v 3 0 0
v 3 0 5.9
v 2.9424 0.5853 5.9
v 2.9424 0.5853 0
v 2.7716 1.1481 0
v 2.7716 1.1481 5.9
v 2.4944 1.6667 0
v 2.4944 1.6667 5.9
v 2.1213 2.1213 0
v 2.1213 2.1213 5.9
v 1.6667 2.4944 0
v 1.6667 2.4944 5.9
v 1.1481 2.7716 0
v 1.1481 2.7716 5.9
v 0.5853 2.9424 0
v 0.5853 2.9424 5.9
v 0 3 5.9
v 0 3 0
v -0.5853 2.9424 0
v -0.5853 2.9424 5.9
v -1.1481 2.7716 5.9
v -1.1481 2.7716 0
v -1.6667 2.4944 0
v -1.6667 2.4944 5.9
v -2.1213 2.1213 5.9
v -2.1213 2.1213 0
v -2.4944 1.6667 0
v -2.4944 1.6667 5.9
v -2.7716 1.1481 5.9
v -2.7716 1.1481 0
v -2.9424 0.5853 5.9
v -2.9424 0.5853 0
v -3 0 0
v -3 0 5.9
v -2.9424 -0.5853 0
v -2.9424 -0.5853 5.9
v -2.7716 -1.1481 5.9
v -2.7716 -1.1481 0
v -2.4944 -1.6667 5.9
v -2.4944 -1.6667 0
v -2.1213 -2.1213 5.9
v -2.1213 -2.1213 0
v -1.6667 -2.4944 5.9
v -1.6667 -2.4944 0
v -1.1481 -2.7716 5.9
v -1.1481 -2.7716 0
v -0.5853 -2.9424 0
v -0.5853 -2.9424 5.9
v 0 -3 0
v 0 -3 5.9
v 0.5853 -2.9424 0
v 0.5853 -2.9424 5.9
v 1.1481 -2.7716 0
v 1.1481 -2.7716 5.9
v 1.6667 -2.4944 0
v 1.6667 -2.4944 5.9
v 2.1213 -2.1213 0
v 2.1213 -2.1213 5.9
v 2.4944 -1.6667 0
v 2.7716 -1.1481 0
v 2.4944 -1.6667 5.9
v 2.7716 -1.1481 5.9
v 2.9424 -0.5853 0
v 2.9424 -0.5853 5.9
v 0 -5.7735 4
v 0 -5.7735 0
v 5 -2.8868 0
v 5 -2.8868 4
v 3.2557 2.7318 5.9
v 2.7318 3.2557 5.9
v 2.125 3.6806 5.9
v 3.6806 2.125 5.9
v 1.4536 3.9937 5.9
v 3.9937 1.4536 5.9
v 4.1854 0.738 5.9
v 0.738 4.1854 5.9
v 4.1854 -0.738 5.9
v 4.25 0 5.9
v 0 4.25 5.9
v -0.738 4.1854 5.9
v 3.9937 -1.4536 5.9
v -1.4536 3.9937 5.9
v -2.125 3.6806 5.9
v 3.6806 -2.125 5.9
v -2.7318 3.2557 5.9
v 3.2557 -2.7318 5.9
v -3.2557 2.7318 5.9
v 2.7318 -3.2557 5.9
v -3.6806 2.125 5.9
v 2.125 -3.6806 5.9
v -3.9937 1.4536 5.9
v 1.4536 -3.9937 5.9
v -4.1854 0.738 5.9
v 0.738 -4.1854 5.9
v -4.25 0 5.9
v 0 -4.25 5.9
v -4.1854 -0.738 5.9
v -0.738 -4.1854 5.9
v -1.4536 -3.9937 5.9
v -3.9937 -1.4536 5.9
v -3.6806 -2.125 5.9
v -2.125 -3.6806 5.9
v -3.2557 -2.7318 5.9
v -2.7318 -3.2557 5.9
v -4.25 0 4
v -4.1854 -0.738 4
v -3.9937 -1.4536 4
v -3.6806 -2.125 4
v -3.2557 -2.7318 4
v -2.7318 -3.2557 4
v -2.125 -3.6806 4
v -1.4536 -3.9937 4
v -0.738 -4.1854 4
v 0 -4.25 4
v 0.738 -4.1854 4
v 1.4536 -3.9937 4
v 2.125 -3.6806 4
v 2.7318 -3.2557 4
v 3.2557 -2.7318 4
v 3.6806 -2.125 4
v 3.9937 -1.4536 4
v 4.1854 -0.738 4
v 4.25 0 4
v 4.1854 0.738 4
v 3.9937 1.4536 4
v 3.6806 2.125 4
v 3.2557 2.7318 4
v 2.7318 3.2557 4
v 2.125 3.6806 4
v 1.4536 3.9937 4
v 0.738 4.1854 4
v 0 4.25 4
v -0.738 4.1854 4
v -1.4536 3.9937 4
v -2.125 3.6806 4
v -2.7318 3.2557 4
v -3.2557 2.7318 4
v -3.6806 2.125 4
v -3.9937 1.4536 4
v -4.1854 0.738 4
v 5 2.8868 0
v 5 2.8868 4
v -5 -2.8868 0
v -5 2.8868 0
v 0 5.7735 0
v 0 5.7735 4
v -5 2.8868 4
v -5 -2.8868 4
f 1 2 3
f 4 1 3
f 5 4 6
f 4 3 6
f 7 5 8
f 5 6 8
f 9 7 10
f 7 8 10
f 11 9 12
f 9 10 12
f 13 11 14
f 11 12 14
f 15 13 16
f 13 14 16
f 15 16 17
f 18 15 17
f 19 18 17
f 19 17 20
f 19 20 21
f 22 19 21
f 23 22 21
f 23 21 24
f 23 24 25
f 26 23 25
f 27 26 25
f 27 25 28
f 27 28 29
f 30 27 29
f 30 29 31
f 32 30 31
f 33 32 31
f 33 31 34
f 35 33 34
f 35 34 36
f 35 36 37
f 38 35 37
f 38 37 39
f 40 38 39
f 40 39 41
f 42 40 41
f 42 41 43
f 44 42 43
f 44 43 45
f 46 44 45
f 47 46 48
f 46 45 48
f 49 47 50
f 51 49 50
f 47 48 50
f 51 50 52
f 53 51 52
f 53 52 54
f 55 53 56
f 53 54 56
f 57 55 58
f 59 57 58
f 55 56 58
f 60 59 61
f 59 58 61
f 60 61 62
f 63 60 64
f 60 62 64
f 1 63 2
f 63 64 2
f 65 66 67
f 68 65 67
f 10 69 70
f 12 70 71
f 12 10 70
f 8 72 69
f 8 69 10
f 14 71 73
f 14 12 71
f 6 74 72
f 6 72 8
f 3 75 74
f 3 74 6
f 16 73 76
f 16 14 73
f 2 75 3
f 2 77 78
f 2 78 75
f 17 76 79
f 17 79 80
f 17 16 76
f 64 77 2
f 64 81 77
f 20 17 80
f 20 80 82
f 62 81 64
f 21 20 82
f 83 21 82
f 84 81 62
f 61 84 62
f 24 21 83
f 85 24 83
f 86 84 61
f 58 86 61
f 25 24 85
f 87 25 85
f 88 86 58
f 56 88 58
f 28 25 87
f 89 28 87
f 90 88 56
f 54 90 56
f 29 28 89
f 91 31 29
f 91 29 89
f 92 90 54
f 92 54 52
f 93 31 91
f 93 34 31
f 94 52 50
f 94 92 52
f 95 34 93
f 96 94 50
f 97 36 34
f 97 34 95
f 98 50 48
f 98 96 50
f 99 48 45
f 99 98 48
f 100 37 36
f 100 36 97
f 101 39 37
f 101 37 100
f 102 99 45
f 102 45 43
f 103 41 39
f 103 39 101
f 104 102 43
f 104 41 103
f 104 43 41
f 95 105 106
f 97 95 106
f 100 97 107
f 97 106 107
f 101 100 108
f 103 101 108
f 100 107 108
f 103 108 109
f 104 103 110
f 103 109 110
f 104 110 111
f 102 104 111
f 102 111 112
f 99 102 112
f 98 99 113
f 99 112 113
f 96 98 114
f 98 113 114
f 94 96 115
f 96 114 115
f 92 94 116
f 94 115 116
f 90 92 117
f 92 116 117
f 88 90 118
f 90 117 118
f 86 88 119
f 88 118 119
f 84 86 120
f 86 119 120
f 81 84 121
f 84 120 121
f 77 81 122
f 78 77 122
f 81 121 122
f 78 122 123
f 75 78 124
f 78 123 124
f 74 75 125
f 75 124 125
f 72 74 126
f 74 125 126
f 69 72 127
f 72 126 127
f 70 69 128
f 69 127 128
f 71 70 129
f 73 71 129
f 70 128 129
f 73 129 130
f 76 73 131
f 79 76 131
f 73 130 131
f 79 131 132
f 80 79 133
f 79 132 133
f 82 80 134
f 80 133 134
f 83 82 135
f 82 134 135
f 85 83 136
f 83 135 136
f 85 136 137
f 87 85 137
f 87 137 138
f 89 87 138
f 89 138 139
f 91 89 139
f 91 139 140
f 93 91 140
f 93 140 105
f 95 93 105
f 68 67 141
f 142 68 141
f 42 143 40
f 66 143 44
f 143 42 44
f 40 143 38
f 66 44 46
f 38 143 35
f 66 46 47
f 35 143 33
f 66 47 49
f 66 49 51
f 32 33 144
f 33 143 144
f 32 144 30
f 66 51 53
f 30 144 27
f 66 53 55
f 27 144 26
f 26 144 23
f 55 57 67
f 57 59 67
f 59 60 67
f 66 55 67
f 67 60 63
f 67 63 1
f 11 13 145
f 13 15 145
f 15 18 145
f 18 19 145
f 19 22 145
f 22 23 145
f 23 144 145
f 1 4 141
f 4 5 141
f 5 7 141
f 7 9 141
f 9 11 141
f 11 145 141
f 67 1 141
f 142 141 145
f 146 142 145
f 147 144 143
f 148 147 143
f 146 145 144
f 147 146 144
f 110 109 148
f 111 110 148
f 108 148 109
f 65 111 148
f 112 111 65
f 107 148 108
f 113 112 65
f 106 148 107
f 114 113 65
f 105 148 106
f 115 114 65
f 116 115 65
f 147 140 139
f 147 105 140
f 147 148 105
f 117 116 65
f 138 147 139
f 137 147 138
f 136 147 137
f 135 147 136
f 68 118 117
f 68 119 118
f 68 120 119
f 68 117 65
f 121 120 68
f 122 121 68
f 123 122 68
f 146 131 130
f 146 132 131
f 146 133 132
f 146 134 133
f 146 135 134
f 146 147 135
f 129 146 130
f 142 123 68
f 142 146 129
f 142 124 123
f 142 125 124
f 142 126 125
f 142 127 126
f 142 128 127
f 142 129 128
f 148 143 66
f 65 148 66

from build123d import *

# Parameters (mm, degrees)
EXTRUDE_1_DEPTH     = 4
SKETCH_2_R          = 4.25
EXTRUDE_2_DEPTH     = 1.9
SKETCH_3_R          = 3
CUT_EXTRUDE_1_DEPTH = 9.9


with BuildPart() as part:
    # 草图1 → 凸台-拉伸1 (new body)
    with BuildSketch(Plane.XY):
        Polygon((0, 5.773502692), (-5, 2.886751346), (-5, -2.886751346), (0, -5.773502692), (5, -2.886751346), (5, 2.886751346), align=None)
    extrude(amount=EXTRUDE_1_DEPTH)

    # 草图2 → 凸台-拉伸2 (add)
    with BuildSketch(Plane.XY.offset(4)):
        with Locations(Location((0, 0, 0), (0, 0, 180))):
            Circle(SKETCH_2_R)
    extrude(amount=EXTRUDE_2_DEPTH)

    # 草图3 → 切除-拉伸1 (cut)
    with BuildSketch(Plane.XY.offset(5.9)):
        Circle(SKETCH_3_R)
    extrude(amount=-CUT_EXTRUDE_1_DEPTH, mode=Mode.SUBTRACT)


solid = part.part
